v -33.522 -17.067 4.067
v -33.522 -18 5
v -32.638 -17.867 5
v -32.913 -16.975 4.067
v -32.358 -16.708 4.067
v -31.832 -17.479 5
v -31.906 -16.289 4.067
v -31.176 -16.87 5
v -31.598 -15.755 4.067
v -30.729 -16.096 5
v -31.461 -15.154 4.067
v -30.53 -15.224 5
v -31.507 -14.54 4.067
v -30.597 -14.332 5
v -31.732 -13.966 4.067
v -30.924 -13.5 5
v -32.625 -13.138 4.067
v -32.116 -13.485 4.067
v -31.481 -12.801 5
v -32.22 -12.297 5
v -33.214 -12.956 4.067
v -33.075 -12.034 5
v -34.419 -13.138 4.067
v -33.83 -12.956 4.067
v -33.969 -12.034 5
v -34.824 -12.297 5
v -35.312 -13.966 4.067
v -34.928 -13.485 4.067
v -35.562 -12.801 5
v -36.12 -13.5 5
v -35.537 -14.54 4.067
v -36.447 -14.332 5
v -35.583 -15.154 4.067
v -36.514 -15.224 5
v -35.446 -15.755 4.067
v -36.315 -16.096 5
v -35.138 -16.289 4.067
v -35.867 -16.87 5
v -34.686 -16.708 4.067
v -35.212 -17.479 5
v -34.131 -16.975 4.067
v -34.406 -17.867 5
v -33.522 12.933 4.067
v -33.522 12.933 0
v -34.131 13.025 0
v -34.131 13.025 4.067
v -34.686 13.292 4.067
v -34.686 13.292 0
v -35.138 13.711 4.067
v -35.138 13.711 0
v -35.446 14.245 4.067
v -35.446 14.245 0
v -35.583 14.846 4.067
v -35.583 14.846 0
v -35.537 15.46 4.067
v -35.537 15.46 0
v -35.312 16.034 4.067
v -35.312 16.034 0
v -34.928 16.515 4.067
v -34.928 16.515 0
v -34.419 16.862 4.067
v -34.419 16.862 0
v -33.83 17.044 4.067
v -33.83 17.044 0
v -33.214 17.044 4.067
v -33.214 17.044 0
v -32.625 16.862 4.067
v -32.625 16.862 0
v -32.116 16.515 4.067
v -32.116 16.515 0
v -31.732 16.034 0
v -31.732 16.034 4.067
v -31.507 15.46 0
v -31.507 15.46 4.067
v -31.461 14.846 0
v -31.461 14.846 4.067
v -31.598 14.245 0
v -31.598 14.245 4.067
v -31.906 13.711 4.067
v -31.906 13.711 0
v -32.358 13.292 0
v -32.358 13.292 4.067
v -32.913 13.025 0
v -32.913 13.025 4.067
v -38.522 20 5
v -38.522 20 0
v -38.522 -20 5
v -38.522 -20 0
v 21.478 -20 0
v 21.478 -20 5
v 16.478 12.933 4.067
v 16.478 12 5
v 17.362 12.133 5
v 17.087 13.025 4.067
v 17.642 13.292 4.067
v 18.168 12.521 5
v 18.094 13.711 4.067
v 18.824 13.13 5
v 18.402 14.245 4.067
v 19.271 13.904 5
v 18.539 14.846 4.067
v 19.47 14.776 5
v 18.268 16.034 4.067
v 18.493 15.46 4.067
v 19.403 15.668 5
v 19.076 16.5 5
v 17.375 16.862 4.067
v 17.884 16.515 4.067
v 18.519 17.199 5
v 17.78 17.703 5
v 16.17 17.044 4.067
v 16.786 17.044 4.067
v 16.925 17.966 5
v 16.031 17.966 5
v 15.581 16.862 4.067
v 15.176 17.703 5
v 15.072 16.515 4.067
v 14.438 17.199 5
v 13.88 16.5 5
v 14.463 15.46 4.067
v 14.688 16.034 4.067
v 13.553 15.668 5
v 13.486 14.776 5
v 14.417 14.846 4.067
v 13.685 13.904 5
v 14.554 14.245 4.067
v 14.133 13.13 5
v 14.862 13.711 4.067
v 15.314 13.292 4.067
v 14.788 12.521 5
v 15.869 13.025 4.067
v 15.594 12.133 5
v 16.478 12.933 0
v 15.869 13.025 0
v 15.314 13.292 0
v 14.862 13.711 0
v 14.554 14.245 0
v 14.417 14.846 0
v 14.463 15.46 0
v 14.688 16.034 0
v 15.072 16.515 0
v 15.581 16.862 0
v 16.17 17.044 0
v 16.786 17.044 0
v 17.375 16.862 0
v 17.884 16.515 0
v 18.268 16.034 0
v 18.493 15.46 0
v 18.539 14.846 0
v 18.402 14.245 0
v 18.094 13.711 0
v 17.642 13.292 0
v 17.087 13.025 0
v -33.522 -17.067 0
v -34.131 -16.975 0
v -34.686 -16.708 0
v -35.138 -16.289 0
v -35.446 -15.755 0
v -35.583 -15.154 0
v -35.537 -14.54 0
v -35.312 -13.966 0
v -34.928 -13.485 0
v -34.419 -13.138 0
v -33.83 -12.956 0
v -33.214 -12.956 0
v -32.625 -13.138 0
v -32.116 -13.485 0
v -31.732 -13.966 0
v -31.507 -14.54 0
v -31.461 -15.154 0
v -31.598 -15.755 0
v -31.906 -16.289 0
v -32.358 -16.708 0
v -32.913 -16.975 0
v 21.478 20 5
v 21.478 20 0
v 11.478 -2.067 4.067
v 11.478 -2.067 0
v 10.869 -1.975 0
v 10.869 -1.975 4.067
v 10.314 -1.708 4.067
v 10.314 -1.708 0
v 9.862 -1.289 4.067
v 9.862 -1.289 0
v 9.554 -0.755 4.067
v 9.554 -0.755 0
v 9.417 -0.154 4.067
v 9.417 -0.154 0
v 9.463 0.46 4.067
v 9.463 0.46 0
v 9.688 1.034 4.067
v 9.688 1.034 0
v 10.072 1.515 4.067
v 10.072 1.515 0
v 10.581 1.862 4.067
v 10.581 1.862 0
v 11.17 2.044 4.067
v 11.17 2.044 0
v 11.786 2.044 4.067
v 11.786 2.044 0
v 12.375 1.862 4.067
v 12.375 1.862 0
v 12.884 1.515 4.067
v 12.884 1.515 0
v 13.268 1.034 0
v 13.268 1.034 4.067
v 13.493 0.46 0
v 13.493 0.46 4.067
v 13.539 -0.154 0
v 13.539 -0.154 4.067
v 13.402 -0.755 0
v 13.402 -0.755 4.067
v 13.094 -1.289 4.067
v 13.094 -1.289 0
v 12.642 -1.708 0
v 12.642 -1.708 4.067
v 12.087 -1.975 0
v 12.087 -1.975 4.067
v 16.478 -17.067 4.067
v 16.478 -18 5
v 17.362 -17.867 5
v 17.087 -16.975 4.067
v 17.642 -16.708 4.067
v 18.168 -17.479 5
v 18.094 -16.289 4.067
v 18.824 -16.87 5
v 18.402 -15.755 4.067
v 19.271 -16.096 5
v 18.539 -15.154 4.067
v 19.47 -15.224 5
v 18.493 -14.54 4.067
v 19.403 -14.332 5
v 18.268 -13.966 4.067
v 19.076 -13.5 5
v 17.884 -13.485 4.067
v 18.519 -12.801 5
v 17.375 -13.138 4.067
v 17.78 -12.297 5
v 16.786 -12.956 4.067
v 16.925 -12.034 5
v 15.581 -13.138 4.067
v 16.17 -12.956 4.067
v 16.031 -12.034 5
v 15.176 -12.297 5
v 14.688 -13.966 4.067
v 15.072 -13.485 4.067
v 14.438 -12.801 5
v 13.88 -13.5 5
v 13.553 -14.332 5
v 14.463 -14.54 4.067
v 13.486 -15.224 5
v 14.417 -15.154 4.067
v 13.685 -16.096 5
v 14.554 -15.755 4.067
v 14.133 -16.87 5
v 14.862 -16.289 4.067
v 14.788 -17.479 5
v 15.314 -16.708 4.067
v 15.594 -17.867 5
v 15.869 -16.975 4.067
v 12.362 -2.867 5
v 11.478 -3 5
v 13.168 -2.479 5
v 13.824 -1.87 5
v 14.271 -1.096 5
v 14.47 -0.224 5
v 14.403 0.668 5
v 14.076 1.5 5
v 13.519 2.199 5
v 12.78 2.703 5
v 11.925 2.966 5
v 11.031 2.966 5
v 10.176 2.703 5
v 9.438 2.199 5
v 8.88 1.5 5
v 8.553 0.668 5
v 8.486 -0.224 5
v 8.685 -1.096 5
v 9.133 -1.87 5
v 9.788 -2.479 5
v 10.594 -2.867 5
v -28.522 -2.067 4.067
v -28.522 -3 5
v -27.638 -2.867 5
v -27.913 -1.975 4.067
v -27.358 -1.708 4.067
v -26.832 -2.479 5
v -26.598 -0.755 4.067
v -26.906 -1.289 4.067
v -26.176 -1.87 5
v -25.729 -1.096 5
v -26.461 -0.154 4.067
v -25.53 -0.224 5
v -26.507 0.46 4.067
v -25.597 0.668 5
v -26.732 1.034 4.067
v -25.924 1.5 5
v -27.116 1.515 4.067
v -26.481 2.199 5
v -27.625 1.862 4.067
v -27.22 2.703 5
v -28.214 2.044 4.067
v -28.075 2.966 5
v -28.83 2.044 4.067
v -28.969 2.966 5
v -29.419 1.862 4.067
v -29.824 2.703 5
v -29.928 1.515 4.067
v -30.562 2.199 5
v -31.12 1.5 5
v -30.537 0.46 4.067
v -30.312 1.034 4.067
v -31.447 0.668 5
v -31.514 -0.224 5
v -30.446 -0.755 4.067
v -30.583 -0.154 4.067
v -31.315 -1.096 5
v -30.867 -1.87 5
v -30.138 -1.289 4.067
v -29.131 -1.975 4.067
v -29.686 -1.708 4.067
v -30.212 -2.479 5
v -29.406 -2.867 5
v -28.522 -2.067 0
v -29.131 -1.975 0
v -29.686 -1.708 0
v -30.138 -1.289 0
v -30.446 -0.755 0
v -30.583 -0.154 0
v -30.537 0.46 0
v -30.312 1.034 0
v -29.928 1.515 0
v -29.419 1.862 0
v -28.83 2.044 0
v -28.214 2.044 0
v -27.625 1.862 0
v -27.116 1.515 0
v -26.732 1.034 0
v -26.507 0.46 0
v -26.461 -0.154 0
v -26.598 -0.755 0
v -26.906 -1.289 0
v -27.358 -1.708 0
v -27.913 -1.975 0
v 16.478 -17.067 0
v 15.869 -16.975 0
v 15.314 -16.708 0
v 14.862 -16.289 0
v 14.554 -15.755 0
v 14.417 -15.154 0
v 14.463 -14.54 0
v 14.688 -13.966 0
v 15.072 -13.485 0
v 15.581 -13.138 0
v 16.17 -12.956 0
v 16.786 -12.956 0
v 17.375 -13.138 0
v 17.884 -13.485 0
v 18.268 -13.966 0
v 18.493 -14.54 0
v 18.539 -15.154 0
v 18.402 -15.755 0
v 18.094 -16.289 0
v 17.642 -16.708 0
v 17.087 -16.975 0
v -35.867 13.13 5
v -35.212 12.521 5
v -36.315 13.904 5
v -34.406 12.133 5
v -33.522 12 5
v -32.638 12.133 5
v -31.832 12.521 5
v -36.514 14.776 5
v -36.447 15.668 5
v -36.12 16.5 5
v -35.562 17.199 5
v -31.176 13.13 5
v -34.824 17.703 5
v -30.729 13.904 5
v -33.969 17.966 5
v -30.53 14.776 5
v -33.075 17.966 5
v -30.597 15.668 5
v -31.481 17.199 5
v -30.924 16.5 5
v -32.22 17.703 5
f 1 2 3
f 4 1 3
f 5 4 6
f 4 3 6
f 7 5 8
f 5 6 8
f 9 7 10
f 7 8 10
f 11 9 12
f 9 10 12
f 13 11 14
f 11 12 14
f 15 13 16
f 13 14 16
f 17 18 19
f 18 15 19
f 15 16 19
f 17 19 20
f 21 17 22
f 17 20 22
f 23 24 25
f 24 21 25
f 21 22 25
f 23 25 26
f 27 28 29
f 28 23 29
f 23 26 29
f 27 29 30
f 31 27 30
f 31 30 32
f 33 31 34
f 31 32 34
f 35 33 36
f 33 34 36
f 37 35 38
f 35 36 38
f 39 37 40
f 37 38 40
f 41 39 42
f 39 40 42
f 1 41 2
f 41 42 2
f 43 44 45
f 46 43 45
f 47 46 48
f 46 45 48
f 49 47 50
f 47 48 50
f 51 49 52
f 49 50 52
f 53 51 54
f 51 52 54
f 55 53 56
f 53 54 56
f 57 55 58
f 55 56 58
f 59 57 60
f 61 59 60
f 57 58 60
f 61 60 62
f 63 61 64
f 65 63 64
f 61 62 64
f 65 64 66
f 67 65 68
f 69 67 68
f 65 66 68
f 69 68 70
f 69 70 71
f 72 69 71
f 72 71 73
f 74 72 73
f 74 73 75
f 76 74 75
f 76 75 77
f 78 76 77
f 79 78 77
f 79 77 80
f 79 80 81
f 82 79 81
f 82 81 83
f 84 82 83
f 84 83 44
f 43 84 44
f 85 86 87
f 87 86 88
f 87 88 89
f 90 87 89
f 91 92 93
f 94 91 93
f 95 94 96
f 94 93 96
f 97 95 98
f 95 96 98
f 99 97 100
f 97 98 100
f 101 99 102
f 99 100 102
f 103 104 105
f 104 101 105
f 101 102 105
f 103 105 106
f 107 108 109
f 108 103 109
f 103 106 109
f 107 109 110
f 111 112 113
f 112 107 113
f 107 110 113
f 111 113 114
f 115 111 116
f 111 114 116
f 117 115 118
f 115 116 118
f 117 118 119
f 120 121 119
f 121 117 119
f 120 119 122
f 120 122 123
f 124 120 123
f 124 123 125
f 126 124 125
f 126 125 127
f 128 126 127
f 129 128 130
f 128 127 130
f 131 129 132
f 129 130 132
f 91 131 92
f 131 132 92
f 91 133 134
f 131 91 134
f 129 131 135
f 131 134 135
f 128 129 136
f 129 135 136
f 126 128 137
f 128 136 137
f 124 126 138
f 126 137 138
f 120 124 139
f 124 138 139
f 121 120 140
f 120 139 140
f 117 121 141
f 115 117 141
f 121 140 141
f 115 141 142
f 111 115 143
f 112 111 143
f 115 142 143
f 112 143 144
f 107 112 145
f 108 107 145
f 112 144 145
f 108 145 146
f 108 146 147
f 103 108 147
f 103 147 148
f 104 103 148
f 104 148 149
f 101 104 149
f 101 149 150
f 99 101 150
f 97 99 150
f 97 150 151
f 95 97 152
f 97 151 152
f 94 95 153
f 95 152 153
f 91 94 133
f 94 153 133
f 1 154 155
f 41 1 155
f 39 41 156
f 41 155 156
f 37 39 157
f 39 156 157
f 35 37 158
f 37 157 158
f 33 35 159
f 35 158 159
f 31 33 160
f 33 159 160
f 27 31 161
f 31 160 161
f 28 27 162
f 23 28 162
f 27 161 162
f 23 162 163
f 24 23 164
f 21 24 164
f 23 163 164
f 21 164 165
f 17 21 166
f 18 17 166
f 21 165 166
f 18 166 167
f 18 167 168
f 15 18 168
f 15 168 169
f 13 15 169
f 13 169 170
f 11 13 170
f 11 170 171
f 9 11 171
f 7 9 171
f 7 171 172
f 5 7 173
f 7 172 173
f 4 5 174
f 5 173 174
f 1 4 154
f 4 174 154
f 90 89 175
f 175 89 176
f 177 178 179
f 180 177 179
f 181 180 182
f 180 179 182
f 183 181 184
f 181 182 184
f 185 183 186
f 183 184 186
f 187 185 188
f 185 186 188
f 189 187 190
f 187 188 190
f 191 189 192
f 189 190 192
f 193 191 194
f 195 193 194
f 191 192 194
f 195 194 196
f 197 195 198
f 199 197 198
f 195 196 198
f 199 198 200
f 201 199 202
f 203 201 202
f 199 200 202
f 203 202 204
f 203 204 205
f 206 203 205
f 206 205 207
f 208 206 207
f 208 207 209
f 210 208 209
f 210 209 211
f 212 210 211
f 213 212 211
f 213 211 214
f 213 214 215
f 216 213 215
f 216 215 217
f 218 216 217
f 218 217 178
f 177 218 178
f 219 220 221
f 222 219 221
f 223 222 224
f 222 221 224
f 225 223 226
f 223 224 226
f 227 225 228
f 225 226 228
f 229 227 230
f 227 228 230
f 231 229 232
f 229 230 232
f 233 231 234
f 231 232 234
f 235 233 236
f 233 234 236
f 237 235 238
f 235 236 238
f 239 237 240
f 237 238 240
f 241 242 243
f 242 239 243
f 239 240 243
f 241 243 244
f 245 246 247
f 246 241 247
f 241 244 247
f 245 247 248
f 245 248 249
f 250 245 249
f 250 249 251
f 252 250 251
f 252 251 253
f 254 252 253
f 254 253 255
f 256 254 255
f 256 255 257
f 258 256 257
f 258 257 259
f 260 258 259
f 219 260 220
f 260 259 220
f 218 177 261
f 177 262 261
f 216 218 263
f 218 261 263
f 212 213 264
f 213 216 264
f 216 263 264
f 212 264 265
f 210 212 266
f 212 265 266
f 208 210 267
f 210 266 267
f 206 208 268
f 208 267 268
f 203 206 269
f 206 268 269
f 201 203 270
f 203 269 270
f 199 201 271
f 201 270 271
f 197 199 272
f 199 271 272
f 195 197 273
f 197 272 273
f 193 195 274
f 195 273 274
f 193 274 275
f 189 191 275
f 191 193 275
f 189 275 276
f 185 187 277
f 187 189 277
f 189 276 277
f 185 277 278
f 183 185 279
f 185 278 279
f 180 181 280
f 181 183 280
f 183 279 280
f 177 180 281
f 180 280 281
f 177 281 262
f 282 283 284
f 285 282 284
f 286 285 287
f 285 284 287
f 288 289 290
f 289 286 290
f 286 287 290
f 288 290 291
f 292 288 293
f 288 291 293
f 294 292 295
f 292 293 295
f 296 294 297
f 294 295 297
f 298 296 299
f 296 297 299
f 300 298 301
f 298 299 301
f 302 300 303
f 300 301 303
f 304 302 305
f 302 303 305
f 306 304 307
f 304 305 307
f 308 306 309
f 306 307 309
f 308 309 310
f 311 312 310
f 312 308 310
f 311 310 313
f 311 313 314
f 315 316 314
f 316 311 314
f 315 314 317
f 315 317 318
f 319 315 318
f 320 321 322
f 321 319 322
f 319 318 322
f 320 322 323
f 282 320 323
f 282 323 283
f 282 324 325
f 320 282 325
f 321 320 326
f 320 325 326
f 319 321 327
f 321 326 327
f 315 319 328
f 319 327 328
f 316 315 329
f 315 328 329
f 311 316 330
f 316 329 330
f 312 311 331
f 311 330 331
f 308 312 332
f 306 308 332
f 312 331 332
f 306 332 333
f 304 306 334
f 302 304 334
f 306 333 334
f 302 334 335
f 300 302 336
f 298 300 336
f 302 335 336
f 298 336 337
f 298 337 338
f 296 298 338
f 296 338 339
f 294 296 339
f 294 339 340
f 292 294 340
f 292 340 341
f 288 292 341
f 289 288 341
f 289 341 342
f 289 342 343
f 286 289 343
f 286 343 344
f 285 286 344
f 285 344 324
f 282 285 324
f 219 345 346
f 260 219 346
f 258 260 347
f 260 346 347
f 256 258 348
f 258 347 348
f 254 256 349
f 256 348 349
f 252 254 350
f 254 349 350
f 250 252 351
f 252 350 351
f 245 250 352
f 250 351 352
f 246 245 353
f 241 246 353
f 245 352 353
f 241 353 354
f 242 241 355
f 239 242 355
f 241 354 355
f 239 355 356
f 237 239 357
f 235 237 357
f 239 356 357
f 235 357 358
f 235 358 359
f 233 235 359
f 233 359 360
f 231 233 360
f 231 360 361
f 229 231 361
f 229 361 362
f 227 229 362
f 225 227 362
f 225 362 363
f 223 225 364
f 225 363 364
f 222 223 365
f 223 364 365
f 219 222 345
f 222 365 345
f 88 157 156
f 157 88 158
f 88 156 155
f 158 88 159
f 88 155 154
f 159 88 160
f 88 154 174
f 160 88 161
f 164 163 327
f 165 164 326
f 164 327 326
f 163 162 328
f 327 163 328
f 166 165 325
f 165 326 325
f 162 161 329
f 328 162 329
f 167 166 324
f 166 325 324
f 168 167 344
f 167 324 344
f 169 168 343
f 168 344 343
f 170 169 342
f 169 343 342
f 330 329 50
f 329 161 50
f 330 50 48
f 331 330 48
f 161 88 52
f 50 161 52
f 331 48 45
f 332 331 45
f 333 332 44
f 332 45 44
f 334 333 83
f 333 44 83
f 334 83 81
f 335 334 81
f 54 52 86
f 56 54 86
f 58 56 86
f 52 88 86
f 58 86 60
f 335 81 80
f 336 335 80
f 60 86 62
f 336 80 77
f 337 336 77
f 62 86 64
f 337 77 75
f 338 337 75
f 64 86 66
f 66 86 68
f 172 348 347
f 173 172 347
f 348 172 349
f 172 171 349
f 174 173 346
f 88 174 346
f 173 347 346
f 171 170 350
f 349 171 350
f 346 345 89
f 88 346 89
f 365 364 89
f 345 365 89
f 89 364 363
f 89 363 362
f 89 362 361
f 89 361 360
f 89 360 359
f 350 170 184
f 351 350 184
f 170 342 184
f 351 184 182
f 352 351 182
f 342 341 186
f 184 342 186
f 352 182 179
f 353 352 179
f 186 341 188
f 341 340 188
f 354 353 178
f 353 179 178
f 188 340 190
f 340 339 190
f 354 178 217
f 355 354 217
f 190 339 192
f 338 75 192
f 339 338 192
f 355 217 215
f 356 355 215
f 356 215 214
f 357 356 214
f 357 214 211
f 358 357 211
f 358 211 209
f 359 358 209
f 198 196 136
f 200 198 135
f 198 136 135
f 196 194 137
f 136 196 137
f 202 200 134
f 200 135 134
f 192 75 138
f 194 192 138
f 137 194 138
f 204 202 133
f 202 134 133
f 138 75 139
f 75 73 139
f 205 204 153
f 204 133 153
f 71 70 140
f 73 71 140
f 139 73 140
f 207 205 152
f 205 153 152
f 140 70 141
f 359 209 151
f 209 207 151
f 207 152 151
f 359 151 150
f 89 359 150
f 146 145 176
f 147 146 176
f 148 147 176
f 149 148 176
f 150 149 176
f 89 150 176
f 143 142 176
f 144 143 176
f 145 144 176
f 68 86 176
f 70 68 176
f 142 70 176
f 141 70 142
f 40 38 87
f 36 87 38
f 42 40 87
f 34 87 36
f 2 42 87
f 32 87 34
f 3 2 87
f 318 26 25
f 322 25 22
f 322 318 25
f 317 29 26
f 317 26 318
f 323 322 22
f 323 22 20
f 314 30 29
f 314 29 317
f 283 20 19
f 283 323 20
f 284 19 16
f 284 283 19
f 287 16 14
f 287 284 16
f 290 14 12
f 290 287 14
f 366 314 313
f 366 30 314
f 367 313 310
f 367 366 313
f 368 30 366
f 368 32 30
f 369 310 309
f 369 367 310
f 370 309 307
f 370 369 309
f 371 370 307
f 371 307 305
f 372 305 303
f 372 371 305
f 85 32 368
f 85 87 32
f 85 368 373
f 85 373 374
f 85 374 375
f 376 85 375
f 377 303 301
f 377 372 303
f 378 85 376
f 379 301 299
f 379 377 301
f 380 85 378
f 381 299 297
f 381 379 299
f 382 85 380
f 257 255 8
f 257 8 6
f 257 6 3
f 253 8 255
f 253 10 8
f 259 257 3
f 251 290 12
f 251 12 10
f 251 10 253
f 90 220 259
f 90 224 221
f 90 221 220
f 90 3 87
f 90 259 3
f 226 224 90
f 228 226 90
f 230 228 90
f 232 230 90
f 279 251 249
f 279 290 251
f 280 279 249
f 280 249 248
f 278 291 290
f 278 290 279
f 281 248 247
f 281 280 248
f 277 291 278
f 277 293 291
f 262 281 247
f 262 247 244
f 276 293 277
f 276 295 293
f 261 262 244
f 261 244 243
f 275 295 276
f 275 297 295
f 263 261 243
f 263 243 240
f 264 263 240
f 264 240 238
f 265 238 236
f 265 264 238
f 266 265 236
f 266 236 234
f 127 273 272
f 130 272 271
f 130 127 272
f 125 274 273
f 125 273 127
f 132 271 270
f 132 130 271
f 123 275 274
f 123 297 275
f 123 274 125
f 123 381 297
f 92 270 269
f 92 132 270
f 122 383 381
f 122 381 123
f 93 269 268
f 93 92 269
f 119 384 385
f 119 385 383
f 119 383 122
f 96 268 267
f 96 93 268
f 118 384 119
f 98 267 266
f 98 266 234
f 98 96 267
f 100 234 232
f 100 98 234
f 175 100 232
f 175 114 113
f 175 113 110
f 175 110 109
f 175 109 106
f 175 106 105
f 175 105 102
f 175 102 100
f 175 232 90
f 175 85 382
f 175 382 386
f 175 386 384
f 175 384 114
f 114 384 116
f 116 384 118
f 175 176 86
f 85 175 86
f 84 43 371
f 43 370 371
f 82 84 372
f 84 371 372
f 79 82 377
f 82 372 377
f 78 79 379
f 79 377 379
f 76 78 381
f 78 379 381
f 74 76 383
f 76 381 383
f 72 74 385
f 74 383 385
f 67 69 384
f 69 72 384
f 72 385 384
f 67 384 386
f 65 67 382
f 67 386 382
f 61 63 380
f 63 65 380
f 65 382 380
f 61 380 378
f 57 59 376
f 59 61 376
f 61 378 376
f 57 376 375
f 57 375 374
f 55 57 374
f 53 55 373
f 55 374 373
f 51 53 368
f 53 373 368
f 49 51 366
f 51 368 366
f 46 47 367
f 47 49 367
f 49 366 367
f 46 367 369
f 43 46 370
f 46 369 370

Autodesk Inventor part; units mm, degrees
ref_plane "YZ Plane" through (0, 0, 0) normal (1, 0, 0) x (0, 1, 0)
ref_plane "XZ Plane" through (0, 0, 0) normal (0, 1, 0) x (-1, 0, 0)
ref_plane "XY Plane" through (0, 0, 0) normal (0, 0, 1) x (1, 0, 0)
sketch "Szkic1" plane through (0, 0, 0) normal (0, 0, 1) x (1, 0, 0)
  line L0 (21.4781, -20) -> (21.4781, 20)
  line L1 (-21.5797, -20) -> (21.4781, -20)
  line L2 (-38.5219, 20) -> (-38.5219, -20)
  line L3 (-38.5219, -20) -> (-25.4723, -20)
  line L4 (-25.4723, -20) -> (-21.5797, -20)
  line L5 (-31.9971, 20) -> (-38.5219, 20)
  line L6 (21.4781, 20) -> (6.0004, 20)
  line L7 (6.0004, 20) -> (-31.9971, 20)
  point P0 (0, 0)
extrude "Wyciągnięcie proste1" add sketch "Szkic1" along normal blind 5
sketch "Szkic2" plane through (0, 0, 5) normal (0, 0, 1) x (1, 0, 0)
  circle A0 centre (16.4781, 15) radius 2.067 projected
  circle A1 centre (16.4781, -15) radius 2.067 projected
  circle A2 centre (-33.5219, -15) radius 2.067 projected
  circle A3 centre (-33.5219, 15) radius 2.067 projected
  point P0 (0, 0)
hole "Otwór1" at (16.4781, -15, 5) at (-33.5219, -15, 5) at (16.4781, 15, 5) at (-33.5219, 15, 5) direction (0, 0, -1) diameter 4.134 end through all countersink diameter 6 countersink angle 90 thread size "M5x0.8" class "6H" standard "ISO Metric profile"
sketch "Szkic3" plane through (0, 0, 5) normal (0, 0, 1) x (1, 0, 0)
  line L0 (21.4781, 20) -> (-38.5219, 20) projected
  line L1 (21.4781, -20) -> (21.4781, 20) projected
  line L2 (-38.5219, 20) -> (-38.5219, -20) projected
  point P0 (0, 0)
  point P1 (11.4781, 0)
  point P2 (-28.5219, 0)
  dimension "d9" = 20
  dimension "d10" = 10
  dimension "d11" = 20
  dimension "d12" = 10
hole "Otwór2" at (11.4781, 0, 5) at (-28.5219, 0, 5) direction (0, 0, -1) diameter 4.134 end through all countersink diameter 6 countersink angle 90 thread size "M5x0.8" class "6H" standard "ISO Metric profile"
properties part number "podstawka"
